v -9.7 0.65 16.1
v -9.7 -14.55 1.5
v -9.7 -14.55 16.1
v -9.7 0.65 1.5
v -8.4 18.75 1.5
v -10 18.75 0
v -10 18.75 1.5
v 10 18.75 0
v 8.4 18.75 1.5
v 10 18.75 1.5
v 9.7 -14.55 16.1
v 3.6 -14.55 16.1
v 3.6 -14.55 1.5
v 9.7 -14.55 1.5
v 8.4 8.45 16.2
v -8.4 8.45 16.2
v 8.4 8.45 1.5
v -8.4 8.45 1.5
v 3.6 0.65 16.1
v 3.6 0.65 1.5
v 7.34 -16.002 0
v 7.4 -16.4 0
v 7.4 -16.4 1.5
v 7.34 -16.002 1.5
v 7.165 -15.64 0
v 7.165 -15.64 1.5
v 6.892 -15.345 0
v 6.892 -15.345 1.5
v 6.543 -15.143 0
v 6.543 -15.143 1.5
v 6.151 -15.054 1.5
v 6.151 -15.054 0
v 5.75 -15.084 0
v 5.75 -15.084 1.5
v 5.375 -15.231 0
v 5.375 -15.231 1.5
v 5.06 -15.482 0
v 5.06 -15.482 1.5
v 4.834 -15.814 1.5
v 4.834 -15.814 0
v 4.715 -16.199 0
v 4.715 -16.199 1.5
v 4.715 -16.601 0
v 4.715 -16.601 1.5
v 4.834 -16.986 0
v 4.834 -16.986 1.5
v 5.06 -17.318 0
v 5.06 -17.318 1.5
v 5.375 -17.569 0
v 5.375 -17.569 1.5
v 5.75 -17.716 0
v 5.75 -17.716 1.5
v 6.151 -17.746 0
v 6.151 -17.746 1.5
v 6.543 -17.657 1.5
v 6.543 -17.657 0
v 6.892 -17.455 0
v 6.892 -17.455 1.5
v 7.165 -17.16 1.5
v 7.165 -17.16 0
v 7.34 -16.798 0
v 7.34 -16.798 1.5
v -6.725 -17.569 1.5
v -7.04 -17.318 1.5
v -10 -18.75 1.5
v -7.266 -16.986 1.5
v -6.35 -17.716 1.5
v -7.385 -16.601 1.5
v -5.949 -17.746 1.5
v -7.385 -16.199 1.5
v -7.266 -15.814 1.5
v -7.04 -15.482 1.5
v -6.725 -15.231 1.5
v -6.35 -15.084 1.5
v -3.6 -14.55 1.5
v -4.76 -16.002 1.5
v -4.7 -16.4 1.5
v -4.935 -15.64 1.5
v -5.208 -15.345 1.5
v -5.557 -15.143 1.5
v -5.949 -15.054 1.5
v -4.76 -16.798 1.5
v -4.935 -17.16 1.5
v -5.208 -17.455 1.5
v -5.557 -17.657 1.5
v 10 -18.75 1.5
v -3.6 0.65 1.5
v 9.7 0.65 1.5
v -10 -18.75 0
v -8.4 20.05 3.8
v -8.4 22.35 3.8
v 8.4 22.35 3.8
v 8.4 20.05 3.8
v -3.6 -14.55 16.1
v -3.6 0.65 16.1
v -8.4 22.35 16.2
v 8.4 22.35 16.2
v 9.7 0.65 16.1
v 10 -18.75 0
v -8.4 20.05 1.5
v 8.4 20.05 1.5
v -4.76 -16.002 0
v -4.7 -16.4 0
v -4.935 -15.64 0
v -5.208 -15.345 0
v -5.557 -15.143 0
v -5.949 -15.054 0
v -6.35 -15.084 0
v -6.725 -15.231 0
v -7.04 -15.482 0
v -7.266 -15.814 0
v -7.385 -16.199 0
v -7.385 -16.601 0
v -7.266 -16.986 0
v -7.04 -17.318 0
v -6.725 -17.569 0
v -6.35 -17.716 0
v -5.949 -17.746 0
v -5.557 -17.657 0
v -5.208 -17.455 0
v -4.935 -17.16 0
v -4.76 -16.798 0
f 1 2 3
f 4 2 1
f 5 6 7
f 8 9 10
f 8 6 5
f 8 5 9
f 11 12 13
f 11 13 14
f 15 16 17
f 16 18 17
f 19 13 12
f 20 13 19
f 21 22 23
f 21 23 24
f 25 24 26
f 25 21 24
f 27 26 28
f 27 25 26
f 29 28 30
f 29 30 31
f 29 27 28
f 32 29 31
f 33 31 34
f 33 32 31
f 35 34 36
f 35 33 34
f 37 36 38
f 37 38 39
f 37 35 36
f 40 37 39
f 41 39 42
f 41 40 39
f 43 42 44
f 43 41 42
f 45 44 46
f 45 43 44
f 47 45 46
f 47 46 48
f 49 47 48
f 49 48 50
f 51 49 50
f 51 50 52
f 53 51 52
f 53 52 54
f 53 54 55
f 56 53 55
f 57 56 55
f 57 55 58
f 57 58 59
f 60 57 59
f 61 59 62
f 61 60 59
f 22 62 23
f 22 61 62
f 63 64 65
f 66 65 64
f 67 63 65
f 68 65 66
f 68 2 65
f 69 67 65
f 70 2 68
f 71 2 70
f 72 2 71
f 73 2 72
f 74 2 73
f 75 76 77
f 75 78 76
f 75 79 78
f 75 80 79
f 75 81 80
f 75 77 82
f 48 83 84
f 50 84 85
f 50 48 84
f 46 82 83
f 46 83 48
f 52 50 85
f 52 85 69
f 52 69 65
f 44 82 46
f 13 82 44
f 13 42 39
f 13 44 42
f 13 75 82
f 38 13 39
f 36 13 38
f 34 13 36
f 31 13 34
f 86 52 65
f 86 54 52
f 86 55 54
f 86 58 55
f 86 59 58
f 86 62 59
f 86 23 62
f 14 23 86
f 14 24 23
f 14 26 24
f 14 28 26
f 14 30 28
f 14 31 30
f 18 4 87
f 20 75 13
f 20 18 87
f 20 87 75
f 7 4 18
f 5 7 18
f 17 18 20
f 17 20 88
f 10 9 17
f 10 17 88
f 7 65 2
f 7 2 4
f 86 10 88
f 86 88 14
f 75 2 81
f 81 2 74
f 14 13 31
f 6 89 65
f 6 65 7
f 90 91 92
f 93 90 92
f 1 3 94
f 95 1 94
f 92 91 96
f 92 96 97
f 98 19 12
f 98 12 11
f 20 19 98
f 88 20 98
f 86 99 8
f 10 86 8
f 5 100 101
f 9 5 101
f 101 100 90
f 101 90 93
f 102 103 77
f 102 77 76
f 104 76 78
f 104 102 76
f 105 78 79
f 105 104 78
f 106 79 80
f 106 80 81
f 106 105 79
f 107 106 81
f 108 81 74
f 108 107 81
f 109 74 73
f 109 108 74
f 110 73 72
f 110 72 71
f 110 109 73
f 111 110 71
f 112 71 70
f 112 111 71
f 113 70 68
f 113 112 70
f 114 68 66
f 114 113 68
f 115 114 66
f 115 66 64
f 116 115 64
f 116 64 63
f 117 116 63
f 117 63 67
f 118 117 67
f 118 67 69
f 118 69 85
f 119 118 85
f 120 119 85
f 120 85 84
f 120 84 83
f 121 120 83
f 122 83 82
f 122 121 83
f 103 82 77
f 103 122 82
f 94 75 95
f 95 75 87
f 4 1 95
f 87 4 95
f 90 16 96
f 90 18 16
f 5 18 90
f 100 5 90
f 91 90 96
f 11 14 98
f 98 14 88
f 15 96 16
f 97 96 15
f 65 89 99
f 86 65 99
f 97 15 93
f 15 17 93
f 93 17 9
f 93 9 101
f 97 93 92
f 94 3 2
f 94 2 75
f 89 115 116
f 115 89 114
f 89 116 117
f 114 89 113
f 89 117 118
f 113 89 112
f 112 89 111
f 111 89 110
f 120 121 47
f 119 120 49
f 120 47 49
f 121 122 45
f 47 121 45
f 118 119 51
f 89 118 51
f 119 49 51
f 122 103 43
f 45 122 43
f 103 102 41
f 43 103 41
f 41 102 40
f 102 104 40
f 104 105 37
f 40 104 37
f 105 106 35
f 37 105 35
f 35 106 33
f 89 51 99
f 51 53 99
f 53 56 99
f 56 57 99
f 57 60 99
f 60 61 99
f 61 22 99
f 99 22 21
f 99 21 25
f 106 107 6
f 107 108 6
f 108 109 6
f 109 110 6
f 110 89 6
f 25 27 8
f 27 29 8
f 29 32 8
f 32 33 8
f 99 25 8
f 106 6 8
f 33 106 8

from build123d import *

# Parameters (mm, degrees)
CROQUIS1_W              = 20
CROQUIS1_H              = 37.5
CROQUIS1_R              = 1.35
SALIENTE_EXTRUIR1_DEPTH = 1.5
CROQUIS2_W              = 16.8
CROQUIS2_H              = 11.6
SALIENTE_EXTRUIR2_DEPTH = 2.3
CROQUIS3_W              = 16.8
CROQUIS3_H              = 13.9
SALIENTE_EXTRUIR3_DEPTH = 12.4
CROQUIS4_W              = 6.1
CROQUIS4_H              = 15.2
SALIENTE_EXTRUIR4_DEPTH = 14.6


with BuildPart() as part:
    # Croquis1 → Saliente-Extruir1 (new body)
    with BuildSketch(Plane.XY):
        Rectangle(CROQUIS1_W, CROQUIS1_H)
        with Locations((-6.05, -16.4)):
            Circle(CROQUIS1_R, mode=Mode.SUBTRACT)
        with Locations((6.05, -16.4)):
            Circle(CROQUIS1_R, mode=Mode.SUBTRACT)
    extrude(amount=SALIENTE_EXTRUIR1_DEPTH)

    # Croquis2 → Saliente-Extruir2 (add)
    with BuildSketch(Plane.XY.offset(1.5)):
        with Locations((0, 14.25)):
            Rectangle(CROQUIS2_W, CROQUIS2_H)
    extrude(amount=SALIENTE_EXTRUIR2_DEPTH)

    # Croquis3 → Saliente-Extruir3 (add)
    with BuildSketch(Plane.XY.offset(3.8)):
        with Locations((0, 15.4)):
            Rectangle(CROQUIS3_W, CROQUIS3_H)
    extrude(amount=SALIENTE_EXTRUIR3_DEPTH)

    # Croquis4 → Saliente-Extruir4 (add)
    with BuildSketch(Plane.XY.offset(1.5)):
        with Locations((-6.65, -6.95)):
            Rectangle(CROQUIS4_W, CROQUIS4_H)
        with Locations((6.65, -6.95)):
            Rectangle(CROQUIS4_W, CROQUIS4_H)
    extrude(amount=SALIENTE_EXTRUIR4_DEPTH)


solid = part.part
